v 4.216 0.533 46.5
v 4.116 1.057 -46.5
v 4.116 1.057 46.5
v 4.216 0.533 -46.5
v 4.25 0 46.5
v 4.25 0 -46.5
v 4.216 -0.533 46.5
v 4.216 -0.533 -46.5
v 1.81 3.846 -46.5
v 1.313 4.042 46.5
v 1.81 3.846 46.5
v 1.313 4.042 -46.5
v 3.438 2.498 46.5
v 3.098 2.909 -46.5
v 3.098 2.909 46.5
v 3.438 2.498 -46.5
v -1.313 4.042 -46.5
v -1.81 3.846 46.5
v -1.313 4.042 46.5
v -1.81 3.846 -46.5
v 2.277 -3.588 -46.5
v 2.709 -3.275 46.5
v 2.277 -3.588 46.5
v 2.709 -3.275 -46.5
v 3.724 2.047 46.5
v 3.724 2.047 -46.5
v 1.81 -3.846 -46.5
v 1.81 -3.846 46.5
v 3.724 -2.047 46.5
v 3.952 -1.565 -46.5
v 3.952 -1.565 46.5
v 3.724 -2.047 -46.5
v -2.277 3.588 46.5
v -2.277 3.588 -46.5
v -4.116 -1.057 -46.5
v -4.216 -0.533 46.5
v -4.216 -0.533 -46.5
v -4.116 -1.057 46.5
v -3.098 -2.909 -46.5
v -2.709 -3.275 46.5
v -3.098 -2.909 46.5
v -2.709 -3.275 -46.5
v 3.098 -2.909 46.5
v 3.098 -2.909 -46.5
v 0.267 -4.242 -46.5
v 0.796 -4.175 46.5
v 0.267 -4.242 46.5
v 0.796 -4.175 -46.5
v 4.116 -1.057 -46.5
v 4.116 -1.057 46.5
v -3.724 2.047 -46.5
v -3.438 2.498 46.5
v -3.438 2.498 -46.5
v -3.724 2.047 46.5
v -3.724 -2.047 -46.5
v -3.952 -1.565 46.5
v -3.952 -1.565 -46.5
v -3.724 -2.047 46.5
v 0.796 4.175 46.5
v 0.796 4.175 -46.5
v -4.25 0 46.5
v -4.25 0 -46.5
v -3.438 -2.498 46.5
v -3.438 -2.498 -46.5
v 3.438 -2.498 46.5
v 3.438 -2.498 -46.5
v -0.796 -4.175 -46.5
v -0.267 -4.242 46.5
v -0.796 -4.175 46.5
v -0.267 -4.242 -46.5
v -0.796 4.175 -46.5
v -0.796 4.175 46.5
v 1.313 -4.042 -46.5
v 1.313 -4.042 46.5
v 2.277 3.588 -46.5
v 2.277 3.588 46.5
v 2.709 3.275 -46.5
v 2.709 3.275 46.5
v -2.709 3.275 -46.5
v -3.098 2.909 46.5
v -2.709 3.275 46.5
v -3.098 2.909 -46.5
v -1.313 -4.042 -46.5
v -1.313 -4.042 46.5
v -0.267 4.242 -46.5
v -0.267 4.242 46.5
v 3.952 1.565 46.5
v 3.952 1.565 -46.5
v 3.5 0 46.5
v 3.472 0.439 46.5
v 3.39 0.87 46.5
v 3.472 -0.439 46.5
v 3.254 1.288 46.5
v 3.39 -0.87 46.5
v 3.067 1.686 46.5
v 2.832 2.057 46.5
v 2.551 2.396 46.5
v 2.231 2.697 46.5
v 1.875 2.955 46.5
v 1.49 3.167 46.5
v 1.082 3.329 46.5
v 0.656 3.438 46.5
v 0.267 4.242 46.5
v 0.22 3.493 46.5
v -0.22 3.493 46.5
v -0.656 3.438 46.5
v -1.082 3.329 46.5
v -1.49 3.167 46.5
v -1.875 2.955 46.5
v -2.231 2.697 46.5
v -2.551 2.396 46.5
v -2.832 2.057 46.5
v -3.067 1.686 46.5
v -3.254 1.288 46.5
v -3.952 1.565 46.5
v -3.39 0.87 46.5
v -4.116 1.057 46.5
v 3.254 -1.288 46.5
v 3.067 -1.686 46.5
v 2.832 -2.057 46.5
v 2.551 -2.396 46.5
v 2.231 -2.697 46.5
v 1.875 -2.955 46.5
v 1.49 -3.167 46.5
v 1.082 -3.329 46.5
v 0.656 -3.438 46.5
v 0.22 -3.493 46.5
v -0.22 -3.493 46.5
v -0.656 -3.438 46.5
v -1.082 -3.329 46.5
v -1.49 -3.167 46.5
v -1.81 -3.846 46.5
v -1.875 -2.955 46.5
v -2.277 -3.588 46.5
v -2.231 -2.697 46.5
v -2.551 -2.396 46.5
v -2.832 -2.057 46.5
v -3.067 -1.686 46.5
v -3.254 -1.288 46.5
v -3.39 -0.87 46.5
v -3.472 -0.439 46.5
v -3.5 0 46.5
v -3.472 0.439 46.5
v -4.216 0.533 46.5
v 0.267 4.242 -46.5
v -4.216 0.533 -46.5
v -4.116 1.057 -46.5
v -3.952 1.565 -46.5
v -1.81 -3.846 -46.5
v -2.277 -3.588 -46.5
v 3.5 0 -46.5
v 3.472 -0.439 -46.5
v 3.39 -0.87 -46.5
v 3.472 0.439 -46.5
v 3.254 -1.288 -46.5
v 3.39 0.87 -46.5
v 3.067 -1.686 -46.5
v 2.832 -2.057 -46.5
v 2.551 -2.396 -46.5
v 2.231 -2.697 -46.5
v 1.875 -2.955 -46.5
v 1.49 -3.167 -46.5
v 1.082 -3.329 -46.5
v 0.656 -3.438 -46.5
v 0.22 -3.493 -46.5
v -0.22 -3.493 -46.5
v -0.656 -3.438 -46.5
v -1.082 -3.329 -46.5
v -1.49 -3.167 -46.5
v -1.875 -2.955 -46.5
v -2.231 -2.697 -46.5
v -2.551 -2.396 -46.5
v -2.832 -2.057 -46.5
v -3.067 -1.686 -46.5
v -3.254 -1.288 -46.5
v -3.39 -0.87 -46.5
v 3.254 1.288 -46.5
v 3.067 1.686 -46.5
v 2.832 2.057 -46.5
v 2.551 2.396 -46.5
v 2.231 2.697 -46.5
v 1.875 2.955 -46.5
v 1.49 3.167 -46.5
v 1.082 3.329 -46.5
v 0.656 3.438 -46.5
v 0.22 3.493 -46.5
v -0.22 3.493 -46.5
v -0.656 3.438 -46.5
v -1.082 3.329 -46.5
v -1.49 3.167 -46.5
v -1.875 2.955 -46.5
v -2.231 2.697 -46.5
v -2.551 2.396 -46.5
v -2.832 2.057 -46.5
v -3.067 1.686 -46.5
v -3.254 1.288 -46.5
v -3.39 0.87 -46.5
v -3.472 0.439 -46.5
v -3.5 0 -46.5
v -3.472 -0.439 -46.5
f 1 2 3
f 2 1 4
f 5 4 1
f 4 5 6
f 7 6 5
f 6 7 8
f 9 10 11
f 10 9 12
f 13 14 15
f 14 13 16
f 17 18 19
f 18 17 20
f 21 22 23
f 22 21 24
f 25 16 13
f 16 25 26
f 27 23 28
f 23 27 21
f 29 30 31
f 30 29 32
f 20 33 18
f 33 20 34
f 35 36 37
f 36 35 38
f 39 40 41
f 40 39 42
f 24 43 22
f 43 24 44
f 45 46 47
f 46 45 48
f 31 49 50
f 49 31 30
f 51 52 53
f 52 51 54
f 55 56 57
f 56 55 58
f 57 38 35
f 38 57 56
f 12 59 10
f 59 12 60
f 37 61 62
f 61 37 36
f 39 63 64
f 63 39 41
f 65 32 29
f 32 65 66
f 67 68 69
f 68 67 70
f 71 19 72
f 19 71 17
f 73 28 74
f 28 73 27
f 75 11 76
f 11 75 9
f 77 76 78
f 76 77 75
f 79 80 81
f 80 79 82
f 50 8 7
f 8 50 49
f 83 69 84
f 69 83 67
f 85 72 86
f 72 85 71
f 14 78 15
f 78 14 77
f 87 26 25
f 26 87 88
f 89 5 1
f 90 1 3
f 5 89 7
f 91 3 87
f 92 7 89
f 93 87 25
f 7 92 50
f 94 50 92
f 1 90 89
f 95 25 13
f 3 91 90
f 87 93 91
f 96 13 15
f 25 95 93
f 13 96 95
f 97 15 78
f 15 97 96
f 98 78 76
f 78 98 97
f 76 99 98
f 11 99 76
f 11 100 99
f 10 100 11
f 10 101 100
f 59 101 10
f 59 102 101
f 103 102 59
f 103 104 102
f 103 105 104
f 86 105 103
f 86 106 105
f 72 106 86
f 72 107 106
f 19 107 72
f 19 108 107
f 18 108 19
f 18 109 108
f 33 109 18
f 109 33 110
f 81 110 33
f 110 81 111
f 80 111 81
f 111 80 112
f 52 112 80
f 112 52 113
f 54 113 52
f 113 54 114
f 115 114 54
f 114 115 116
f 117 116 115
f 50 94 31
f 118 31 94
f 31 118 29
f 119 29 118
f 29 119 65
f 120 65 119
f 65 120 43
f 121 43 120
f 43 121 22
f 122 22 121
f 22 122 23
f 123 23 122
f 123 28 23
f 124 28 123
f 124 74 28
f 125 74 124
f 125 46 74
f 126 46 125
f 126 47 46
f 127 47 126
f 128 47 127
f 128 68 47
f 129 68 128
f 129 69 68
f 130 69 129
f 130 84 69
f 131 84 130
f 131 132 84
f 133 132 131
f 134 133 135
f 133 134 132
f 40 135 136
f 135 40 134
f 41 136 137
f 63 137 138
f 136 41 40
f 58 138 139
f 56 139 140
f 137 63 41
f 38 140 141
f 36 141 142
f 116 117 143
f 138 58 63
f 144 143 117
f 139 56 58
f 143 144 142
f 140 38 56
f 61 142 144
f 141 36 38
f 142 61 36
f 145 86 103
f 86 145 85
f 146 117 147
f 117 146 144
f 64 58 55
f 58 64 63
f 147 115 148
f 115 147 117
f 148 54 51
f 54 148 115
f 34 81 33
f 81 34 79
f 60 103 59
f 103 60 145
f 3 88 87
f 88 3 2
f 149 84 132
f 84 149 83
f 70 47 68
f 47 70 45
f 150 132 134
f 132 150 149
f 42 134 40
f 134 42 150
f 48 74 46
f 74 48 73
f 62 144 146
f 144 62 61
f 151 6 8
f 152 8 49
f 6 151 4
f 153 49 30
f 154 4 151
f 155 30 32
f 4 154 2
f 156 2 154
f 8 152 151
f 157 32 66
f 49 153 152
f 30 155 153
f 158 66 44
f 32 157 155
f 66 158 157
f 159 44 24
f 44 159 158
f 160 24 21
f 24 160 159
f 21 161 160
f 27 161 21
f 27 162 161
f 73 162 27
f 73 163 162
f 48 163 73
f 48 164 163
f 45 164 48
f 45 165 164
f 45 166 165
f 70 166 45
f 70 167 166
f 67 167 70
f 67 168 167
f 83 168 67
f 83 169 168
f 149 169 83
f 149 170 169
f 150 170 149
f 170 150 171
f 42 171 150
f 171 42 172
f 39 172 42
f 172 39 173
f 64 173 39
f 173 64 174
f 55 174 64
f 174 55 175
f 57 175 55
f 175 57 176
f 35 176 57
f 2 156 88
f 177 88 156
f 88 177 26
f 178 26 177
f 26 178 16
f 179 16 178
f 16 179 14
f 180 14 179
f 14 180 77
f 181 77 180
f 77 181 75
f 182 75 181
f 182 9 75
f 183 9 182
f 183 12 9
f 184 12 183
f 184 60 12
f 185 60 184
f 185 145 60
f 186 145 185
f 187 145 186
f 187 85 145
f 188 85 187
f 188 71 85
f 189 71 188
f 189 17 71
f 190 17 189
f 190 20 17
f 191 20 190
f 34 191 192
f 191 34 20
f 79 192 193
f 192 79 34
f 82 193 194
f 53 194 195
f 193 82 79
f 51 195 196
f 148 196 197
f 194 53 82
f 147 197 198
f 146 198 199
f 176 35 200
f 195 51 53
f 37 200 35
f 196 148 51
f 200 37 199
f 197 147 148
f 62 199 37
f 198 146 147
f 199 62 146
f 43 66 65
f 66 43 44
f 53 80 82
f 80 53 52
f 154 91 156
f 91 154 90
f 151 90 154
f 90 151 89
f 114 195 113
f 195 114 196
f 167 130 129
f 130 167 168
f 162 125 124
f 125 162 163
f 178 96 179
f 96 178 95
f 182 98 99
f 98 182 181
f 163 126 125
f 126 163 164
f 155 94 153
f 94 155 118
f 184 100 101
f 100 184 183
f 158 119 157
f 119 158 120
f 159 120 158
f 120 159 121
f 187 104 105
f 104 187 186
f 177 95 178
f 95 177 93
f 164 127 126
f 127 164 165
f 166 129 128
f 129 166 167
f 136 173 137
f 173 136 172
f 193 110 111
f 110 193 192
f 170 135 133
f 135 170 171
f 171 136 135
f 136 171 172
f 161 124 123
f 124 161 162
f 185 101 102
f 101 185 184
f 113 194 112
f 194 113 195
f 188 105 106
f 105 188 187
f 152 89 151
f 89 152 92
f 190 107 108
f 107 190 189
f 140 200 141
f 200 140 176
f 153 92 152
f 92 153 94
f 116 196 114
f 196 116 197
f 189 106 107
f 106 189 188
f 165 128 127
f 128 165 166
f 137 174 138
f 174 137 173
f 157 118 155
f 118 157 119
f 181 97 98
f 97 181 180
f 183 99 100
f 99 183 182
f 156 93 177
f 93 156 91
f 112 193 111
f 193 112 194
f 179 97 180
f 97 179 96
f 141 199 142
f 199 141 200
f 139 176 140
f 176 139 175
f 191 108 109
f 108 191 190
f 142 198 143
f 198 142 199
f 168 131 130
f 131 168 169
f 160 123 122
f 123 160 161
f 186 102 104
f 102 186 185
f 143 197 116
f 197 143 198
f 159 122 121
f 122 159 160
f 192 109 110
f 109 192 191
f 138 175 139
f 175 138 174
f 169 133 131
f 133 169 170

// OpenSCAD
$fn = 50;


difference() {
	union() {
		translate(v = [0, 0, -46.5000000000]) {
			cylinder(h = 93, r = 4.2500000000);
		}
	}
	union() {
		translate(v = [0, 0, -100.0000000000]) {
			cylinder(h = 200, r = 3.5000000000);
		}
	}
}
